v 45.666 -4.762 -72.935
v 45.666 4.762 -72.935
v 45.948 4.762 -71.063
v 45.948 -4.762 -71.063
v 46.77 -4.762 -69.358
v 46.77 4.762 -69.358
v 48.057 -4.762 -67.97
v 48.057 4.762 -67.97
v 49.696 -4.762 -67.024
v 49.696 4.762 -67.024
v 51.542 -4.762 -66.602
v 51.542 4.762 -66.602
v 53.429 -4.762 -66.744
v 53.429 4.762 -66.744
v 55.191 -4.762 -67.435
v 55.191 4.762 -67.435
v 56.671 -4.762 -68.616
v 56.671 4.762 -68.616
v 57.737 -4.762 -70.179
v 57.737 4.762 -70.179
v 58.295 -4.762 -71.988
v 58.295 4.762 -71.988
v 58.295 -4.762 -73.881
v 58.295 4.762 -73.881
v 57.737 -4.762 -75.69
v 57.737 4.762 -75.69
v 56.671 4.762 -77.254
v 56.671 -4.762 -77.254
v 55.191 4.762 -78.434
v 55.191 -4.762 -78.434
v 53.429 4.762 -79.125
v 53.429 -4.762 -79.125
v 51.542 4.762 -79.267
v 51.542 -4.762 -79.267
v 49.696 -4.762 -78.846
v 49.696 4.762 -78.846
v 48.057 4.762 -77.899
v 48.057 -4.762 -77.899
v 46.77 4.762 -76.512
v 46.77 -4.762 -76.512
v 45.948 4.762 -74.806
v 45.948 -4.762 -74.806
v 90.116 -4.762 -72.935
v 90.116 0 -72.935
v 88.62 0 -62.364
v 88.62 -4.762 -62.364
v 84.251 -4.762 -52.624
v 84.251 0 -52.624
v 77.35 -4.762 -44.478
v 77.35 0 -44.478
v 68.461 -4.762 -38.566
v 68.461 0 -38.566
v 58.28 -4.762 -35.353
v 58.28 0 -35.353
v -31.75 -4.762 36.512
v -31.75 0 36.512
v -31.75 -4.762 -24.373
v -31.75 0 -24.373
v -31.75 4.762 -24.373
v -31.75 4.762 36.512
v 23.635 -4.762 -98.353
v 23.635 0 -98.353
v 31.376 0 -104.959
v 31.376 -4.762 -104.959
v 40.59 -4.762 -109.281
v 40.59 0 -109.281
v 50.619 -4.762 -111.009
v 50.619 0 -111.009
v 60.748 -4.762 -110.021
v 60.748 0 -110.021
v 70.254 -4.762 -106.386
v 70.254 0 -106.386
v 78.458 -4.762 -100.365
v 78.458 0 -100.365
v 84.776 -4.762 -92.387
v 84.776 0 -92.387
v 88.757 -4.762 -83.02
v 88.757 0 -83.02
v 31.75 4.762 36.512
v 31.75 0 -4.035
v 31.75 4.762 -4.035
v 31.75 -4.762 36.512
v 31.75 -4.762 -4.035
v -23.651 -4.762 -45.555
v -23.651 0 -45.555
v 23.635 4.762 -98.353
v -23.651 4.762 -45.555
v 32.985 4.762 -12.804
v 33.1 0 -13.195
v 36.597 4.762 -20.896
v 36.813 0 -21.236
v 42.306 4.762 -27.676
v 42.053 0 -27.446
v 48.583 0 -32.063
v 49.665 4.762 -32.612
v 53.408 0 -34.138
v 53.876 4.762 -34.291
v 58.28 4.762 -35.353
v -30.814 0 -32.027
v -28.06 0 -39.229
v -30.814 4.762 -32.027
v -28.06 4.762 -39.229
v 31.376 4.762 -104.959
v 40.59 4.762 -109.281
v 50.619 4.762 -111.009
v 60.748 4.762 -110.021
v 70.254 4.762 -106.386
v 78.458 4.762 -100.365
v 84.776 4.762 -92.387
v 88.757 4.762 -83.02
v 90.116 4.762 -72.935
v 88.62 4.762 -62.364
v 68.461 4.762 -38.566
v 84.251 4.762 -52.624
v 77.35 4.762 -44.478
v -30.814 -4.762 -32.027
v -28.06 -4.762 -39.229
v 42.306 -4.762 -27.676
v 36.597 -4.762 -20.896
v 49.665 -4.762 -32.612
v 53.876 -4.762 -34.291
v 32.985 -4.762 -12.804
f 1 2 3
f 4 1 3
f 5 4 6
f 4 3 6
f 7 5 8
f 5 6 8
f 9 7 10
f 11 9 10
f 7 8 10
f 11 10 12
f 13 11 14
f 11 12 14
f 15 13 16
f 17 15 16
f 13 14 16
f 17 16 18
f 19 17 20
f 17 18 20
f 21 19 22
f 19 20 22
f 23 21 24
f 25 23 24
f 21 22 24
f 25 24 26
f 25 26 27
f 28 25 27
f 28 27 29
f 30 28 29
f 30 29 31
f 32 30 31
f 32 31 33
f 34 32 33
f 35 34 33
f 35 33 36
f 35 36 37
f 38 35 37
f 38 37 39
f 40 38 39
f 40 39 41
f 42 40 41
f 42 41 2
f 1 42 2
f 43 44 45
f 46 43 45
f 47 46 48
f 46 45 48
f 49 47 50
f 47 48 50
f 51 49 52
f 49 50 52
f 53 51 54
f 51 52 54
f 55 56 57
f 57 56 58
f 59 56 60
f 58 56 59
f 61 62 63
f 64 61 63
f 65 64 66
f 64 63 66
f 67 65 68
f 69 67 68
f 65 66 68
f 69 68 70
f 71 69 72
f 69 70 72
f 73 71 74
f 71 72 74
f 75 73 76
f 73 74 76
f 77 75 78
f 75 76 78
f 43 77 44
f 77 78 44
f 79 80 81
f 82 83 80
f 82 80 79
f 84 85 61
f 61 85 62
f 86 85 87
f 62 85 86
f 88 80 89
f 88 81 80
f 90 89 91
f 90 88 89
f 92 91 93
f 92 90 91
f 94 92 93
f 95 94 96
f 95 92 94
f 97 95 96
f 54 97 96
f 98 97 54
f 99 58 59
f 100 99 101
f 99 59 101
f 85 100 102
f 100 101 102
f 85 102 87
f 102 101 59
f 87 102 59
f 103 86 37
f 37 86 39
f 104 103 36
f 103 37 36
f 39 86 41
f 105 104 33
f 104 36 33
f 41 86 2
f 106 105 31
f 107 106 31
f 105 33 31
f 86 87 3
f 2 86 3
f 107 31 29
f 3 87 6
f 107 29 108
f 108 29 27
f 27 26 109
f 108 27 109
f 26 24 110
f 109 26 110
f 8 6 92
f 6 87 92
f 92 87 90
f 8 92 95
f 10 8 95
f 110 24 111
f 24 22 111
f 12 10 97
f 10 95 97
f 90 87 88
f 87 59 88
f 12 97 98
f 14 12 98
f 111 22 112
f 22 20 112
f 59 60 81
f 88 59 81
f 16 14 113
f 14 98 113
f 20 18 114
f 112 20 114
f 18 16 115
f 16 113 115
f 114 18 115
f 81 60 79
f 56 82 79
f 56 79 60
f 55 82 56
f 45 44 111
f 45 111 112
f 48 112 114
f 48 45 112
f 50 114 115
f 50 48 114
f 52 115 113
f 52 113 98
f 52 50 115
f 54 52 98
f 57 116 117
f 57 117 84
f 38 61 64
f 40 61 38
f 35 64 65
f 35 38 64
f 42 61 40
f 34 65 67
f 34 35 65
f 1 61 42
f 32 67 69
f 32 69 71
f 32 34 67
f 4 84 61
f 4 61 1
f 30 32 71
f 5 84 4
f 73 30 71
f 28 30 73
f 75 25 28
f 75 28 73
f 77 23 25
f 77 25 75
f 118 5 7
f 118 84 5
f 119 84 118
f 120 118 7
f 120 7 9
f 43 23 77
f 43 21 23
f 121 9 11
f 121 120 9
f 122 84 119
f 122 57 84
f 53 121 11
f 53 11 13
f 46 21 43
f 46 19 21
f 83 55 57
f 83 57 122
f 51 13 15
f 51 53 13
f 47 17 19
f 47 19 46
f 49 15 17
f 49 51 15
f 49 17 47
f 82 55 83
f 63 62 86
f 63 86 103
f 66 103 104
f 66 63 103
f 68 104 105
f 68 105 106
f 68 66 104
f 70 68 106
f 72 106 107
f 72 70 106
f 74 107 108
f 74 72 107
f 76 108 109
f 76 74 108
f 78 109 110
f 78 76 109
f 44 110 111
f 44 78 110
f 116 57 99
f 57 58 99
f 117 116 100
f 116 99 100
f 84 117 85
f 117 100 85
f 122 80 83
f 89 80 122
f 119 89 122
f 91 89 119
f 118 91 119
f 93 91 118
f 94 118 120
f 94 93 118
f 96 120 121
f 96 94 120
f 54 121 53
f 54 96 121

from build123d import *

# Parameters (mm, degrees)
F1_DEPTH = 4.7625
F3_D     = 12.7
F4_R     = 31.75


# Not quite as in the source:
# - a length typed as a fraction of an inch, garbled in the dataset ("3 / 203.2 mm" for 3/8 in), is restored


with BuildPart() as f1:
    # F0 (on Front) → F1 (new body, symmetric)
    with BuildSketch(Plane.XZ):
        with BuildLine():
            Line((31.75, -36.5125), (31.75, 36.5125))
            Line((31.75, 36.5125), (-31.75, 36.5125))
            Line((-31.75, 36.5125), (-31.75, -36.5125))
            Line((-31.75, -36.5125), (13.9433553622, -74.3740279097))
            ThreePointArc((13.9433553622, -74.3740279097), (19.5317526148, -53.0254697777), (36.0181289039, -38.3560964092))
            Line((36.0181289039, -38.3560964092), (31.75, -36.5125))
        make_face()
        with BuildLine():
            Line((62.0881194933, -49.616895256), (36.0181289039, -38.3560964092))
            ThreePointArc((36.0181289039, -38.3560964092), (19.5317526148, -53.0254697777), (13.9433553622, -74.3740279097))
            Line((13.9433553622, -74.3740279097), (35.8101662485, -92.4928739454))
            ThreePointArc((35.8101662485, -92.4928739454), (73.672422944, -86.207359662), (62.0881194933, -49.616895256))
        make_face()
        with BuildLine():
            ThreePointArc((48.5832224491, -34.9895780081), (42.1559369458, -36.1326186582), (36.0181289039, -38.3560964092))
            Line((36.0181289039, -38.3560964092), (62.0881194933, -49.616895256))
            ThreePointArc((62.0881194933, -49.616895256), (73.672422944, -86.207359662), (35.8101662485, -92.4928739454))
            Line((35.8101662485, -92.4928739454), (13.9433553622, -74.3740279097))
            ThreePointArc((13.9433553622, -74.3740279097), (16.6920555351, -87.2110882282), (23.6346841746, -98.3531426993))
            ThreePointArc((23.6346841746, -98.3531426993), (65.6226967812, -108.5221298326), (90.1161548124, -72.9346037083))
            ThreePointArc((90.1161548124, -72.9346037083), (77.7145523982, -44.8062841439), (48.5832224491, -34.9895780081))
        make_face()
        with BuildLine():
            Line((13.9433553622, -74.3740279097), (-31.75, -36.5125))
            Line((-31.75, -36.5125), (23.6346841746, -98.3531426993))
            ThreePointArc((23.6346841746, -98.3531426993), (16.6920555351, -87.2110882282), (13.9433553622, -74.3740279097))
        make_face()
        with BuildLine():
            Line((48.5832224491, -34.9895780081), (31.75, -36.5125))
            Line((31.75, -36.5125), (36.0181289039, -38.3560964092))
            ThreePointArc((36.0181289039, -38.3560964092), (42.1559369458, -36.1326186582), (48.5832224491, -34.9895780081))
        make_face()
    extrude(amount=F1_DEPTH, both=True)

    # F3 (through all)
    with Locations(Plane.XZ.offset(4.7625)):
        with Locations((52.0161548124, -72.9346037083)):
            Hole(F3_D / 2)

    # F4
    f4_edges = [f1.edges().sort_by_distance(p)[0] for p in [
        (-31.75, 0, -36.5125),
        (31.75, 0, -36.5125),
    ]]
    fillet(f4_edges, radius=F4_R)


solid = f1.part
